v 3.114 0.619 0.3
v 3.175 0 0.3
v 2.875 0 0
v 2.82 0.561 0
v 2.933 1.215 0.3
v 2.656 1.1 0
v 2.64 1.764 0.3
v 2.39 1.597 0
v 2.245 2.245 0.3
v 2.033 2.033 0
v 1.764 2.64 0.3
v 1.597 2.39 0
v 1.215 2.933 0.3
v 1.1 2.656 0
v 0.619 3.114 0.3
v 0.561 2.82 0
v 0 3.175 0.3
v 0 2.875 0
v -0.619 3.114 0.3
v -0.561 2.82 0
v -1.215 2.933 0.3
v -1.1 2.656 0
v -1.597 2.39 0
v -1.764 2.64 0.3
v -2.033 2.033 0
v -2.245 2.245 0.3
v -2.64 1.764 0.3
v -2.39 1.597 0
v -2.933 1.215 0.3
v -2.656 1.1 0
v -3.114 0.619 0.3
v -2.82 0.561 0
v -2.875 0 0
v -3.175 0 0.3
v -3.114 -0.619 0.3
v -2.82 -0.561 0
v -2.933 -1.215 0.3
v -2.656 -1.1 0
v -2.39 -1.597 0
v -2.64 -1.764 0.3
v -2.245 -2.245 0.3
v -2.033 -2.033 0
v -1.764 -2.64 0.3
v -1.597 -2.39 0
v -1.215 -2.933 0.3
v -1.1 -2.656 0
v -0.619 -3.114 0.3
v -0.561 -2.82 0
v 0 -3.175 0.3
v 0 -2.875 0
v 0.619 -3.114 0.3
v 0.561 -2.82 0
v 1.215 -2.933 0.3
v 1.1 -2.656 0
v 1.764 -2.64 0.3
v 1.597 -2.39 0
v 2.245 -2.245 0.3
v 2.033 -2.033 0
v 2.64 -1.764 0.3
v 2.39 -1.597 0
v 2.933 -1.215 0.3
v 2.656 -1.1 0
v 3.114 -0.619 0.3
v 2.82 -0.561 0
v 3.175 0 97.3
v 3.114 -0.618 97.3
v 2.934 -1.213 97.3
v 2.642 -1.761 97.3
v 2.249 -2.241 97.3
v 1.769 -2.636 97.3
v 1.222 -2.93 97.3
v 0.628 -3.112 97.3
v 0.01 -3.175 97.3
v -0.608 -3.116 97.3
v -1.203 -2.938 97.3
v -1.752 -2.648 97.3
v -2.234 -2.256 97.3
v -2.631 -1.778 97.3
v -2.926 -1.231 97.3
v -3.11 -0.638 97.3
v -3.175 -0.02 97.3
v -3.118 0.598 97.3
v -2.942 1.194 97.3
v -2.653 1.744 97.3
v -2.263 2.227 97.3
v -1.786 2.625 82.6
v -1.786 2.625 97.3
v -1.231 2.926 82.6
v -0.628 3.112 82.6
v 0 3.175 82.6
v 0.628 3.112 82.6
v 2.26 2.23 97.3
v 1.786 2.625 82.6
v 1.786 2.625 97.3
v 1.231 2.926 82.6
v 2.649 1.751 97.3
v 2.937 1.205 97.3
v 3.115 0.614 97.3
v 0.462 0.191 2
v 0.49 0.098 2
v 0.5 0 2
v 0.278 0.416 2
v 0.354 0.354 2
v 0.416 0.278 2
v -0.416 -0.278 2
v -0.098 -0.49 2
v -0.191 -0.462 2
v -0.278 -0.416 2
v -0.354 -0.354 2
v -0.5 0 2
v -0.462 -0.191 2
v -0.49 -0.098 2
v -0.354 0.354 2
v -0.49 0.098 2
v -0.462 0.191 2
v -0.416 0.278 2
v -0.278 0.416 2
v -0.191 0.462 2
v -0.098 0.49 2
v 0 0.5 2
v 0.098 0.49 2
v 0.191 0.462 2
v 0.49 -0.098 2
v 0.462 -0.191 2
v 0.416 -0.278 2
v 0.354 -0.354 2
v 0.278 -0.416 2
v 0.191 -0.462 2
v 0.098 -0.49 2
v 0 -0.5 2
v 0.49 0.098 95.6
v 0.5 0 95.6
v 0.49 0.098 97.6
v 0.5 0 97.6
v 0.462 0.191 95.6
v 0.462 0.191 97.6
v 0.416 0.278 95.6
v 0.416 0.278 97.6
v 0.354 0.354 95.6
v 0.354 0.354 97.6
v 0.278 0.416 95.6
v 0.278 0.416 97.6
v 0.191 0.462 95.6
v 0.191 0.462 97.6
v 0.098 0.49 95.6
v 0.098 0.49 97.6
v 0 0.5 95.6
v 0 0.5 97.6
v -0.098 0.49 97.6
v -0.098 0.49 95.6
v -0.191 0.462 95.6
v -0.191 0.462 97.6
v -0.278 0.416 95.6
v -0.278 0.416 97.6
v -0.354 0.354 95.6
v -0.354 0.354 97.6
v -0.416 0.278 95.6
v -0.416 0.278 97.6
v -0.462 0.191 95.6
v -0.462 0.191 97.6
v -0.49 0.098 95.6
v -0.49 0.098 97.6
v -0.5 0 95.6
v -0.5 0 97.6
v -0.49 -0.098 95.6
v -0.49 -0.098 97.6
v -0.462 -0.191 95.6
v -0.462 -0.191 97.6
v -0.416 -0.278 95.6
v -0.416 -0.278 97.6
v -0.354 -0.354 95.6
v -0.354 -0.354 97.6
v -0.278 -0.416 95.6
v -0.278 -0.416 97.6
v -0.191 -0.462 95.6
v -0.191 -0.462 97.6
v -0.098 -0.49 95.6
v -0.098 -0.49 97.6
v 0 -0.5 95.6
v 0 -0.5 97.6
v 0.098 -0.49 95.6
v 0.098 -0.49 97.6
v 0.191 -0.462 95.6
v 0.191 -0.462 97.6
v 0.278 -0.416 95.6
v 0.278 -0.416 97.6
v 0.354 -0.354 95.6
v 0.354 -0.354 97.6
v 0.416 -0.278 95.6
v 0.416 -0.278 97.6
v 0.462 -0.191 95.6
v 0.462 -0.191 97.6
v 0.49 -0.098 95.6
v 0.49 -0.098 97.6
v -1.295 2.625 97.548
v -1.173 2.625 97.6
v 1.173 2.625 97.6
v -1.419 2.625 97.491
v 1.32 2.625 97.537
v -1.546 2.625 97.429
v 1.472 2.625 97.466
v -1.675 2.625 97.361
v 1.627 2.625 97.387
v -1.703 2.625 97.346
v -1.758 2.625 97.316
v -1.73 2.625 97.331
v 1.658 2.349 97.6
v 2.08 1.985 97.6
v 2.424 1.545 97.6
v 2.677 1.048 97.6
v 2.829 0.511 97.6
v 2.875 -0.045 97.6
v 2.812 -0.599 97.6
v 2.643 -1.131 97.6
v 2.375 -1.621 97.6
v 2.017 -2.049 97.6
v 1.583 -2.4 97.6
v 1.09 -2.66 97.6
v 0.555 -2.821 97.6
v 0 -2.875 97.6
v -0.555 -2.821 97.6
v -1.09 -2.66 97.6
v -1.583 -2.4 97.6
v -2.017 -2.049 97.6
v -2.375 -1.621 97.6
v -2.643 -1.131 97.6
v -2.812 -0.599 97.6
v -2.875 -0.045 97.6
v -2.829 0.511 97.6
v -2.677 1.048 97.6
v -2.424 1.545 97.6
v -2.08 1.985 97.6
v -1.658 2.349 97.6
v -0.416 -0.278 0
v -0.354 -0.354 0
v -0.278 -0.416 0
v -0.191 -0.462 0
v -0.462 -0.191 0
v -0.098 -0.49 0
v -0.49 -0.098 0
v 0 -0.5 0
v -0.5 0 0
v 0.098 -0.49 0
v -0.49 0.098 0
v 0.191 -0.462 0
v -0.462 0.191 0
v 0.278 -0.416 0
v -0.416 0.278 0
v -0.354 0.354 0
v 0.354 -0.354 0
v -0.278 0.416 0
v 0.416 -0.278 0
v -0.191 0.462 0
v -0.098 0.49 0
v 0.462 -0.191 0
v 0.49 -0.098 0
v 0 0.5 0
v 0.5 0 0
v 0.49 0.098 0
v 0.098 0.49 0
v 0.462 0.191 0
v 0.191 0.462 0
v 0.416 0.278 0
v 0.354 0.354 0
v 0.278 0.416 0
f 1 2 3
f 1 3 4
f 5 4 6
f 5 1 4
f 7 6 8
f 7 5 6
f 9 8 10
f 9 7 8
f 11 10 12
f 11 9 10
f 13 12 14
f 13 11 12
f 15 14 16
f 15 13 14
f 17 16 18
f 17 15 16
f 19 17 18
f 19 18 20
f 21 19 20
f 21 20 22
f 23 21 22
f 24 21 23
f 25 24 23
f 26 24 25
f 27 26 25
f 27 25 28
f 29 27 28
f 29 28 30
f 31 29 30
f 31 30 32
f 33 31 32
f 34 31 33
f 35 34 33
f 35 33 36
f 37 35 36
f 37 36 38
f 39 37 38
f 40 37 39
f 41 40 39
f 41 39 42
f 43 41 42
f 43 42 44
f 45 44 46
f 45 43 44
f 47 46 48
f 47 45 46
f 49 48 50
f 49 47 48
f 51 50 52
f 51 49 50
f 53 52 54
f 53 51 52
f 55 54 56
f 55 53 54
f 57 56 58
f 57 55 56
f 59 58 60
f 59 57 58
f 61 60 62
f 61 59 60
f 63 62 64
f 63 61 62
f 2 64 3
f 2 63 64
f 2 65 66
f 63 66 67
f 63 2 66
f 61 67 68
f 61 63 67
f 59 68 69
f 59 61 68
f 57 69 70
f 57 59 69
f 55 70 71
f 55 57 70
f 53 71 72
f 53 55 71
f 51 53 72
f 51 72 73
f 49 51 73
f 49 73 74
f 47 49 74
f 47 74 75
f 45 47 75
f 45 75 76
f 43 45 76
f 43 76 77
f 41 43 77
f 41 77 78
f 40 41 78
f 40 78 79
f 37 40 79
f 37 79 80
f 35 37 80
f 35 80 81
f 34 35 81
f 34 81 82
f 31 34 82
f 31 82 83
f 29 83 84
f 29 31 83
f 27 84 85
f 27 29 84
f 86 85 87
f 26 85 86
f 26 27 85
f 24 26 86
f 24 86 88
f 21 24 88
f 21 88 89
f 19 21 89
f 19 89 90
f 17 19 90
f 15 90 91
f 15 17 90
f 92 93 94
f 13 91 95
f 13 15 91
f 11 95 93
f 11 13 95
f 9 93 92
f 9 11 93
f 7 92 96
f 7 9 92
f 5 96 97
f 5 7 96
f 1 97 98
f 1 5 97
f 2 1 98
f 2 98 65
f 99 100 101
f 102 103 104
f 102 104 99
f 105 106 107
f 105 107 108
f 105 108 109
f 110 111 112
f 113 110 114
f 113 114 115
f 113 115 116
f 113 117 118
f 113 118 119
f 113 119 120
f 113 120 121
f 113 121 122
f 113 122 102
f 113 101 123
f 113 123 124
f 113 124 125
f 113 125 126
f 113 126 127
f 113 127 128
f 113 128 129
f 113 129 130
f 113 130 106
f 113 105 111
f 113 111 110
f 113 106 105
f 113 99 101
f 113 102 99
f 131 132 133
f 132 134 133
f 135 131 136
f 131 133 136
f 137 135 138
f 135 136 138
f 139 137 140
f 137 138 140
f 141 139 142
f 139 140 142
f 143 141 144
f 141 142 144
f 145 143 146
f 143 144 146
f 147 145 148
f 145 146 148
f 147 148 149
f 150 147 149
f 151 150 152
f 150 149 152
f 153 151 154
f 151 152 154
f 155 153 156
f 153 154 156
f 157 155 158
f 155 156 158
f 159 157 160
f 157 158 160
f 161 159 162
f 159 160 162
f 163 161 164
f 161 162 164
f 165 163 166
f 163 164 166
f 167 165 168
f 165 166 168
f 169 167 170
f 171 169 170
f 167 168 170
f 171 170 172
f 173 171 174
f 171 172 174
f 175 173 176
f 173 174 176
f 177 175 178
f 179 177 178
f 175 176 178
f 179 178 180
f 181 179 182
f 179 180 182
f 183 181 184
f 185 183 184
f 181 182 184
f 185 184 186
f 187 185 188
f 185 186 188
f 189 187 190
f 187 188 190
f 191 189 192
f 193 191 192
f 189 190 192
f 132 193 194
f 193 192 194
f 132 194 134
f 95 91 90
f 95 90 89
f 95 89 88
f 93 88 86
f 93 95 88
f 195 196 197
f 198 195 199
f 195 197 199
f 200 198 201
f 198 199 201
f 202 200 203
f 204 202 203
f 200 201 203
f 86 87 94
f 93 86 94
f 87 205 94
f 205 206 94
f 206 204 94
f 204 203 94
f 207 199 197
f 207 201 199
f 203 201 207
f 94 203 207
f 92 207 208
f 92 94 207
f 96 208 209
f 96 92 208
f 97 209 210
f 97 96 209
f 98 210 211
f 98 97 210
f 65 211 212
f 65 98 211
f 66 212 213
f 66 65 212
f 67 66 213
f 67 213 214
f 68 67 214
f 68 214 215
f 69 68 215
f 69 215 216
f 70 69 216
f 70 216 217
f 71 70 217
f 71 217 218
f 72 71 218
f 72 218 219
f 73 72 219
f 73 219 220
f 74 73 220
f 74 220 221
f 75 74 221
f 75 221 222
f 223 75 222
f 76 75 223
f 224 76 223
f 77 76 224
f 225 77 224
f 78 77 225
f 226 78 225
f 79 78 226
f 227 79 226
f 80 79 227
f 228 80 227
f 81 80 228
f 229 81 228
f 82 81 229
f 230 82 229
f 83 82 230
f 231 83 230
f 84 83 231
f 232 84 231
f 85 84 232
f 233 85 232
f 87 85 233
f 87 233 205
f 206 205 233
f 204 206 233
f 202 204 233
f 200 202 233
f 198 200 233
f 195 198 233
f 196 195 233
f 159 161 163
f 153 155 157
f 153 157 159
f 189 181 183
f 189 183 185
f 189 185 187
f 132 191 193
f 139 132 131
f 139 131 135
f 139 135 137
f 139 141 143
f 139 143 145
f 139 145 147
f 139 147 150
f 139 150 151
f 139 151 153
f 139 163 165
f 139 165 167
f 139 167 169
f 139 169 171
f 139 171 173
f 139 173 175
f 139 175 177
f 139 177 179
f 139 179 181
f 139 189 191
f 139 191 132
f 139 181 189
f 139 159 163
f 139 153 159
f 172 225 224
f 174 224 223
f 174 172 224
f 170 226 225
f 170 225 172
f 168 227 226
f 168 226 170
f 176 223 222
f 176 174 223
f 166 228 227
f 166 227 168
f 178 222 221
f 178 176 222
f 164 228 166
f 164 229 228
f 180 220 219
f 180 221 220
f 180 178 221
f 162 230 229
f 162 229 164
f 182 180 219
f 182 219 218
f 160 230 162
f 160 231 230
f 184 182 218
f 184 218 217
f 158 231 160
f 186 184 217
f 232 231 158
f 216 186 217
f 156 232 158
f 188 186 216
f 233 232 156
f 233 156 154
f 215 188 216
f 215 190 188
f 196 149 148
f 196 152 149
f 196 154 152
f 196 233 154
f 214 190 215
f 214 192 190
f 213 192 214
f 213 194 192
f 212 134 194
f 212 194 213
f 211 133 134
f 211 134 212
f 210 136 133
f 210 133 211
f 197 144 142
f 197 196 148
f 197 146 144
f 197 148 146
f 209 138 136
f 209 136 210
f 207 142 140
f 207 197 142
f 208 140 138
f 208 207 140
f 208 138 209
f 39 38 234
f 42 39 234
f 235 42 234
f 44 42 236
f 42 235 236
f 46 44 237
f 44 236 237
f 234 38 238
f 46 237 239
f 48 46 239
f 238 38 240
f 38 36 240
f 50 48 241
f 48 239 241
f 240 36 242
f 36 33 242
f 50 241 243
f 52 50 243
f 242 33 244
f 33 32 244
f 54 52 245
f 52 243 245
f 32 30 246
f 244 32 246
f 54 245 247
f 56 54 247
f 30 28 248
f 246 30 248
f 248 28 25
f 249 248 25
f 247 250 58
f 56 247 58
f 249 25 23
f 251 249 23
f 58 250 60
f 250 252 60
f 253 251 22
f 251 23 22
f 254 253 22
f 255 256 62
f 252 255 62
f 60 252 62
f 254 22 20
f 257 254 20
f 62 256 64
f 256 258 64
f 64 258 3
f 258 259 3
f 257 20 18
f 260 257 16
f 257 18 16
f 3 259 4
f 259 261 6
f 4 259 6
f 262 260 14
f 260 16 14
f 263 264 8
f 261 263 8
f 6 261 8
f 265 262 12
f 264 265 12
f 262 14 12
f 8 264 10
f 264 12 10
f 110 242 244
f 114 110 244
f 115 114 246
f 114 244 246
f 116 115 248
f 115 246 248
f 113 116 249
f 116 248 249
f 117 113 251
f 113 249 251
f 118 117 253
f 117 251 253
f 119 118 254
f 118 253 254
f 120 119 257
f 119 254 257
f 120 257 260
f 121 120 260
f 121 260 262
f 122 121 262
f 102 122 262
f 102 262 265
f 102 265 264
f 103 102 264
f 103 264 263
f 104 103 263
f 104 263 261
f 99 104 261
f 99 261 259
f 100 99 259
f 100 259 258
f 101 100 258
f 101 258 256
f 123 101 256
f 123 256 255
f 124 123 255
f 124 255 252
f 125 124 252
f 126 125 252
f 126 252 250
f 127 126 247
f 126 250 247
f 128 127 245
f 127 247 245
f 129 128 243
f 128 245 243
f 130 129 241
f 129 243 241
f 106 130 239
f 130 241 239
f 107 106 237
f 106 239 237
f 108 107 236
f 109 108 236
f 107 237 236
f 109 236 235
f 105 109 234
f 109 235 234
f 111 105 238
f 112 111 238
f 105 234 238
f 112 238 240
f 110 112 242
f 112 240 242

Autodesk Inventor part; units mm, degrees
ref_plane "YZ Plane" through (0, 0, 0) normal (1, 0, 0) x (0, 1, 0)
ref_plane "XZ Plane" through (0, 0, 0) normal (0, 1, 0) x (-1, 0, 0)
ref_plane "XY Plane" through (0, 0, 0) normal (0, 0, 1) x (1, 0, 0)
sketch "Sketch1" plane through (0, 0, 0) normal (0, 0, 1) x (1, 0, 0)
  circle A0 centre (0, 0) radius 3.175
  dimension "d0" = 6.35
extrude "Extrusion1" add sketch "Sketch1" along normal blind 97.6
chamfer "Chamfer1" distance 0.3 angle 45 2 edges at (-3.175, 0, 97.6) (-3.175, 0, 0)
sketch "Sketch2" plane through (0, 0, 97.6) normal (0, 0, 1) x (1, 0, 0)
  circle A0 centre (0, 0) radius 0.5
  dimension "d6" = 1
extrude "Extrusion2" cut sketch "Sketch2" against normal blind 2
sketch "Sketch3" plane through (0, 0, 0) normal (0, 0, -1) x (-1, 0, 0)
  circle A0 centre (0, 0) radius 0.5 projected
extrude "Extrusion3" cut sketch "Sketch3" against normal blind 2
sketch "Sketch4" plane through (0, 0, 97.6) normal (0, 0, 1) x (1, 0, 0)
  circle A0 centre (0, 0) radius 3.175 projected
  line L0 (-1.7861, 2.625) -> (-1.675, 2.625)
  line L1 (-1.675, 2.625) -> (1.7861, 2.625)
  dimension "d11" = 2.625
extrude "Extrusion4" cut sketch "Sketch4" against normal blind 15 contours L1 L0 A0 picked at (0.4083, 2.7411)
properties part number "motorAxis" material "Stainless Steel"
